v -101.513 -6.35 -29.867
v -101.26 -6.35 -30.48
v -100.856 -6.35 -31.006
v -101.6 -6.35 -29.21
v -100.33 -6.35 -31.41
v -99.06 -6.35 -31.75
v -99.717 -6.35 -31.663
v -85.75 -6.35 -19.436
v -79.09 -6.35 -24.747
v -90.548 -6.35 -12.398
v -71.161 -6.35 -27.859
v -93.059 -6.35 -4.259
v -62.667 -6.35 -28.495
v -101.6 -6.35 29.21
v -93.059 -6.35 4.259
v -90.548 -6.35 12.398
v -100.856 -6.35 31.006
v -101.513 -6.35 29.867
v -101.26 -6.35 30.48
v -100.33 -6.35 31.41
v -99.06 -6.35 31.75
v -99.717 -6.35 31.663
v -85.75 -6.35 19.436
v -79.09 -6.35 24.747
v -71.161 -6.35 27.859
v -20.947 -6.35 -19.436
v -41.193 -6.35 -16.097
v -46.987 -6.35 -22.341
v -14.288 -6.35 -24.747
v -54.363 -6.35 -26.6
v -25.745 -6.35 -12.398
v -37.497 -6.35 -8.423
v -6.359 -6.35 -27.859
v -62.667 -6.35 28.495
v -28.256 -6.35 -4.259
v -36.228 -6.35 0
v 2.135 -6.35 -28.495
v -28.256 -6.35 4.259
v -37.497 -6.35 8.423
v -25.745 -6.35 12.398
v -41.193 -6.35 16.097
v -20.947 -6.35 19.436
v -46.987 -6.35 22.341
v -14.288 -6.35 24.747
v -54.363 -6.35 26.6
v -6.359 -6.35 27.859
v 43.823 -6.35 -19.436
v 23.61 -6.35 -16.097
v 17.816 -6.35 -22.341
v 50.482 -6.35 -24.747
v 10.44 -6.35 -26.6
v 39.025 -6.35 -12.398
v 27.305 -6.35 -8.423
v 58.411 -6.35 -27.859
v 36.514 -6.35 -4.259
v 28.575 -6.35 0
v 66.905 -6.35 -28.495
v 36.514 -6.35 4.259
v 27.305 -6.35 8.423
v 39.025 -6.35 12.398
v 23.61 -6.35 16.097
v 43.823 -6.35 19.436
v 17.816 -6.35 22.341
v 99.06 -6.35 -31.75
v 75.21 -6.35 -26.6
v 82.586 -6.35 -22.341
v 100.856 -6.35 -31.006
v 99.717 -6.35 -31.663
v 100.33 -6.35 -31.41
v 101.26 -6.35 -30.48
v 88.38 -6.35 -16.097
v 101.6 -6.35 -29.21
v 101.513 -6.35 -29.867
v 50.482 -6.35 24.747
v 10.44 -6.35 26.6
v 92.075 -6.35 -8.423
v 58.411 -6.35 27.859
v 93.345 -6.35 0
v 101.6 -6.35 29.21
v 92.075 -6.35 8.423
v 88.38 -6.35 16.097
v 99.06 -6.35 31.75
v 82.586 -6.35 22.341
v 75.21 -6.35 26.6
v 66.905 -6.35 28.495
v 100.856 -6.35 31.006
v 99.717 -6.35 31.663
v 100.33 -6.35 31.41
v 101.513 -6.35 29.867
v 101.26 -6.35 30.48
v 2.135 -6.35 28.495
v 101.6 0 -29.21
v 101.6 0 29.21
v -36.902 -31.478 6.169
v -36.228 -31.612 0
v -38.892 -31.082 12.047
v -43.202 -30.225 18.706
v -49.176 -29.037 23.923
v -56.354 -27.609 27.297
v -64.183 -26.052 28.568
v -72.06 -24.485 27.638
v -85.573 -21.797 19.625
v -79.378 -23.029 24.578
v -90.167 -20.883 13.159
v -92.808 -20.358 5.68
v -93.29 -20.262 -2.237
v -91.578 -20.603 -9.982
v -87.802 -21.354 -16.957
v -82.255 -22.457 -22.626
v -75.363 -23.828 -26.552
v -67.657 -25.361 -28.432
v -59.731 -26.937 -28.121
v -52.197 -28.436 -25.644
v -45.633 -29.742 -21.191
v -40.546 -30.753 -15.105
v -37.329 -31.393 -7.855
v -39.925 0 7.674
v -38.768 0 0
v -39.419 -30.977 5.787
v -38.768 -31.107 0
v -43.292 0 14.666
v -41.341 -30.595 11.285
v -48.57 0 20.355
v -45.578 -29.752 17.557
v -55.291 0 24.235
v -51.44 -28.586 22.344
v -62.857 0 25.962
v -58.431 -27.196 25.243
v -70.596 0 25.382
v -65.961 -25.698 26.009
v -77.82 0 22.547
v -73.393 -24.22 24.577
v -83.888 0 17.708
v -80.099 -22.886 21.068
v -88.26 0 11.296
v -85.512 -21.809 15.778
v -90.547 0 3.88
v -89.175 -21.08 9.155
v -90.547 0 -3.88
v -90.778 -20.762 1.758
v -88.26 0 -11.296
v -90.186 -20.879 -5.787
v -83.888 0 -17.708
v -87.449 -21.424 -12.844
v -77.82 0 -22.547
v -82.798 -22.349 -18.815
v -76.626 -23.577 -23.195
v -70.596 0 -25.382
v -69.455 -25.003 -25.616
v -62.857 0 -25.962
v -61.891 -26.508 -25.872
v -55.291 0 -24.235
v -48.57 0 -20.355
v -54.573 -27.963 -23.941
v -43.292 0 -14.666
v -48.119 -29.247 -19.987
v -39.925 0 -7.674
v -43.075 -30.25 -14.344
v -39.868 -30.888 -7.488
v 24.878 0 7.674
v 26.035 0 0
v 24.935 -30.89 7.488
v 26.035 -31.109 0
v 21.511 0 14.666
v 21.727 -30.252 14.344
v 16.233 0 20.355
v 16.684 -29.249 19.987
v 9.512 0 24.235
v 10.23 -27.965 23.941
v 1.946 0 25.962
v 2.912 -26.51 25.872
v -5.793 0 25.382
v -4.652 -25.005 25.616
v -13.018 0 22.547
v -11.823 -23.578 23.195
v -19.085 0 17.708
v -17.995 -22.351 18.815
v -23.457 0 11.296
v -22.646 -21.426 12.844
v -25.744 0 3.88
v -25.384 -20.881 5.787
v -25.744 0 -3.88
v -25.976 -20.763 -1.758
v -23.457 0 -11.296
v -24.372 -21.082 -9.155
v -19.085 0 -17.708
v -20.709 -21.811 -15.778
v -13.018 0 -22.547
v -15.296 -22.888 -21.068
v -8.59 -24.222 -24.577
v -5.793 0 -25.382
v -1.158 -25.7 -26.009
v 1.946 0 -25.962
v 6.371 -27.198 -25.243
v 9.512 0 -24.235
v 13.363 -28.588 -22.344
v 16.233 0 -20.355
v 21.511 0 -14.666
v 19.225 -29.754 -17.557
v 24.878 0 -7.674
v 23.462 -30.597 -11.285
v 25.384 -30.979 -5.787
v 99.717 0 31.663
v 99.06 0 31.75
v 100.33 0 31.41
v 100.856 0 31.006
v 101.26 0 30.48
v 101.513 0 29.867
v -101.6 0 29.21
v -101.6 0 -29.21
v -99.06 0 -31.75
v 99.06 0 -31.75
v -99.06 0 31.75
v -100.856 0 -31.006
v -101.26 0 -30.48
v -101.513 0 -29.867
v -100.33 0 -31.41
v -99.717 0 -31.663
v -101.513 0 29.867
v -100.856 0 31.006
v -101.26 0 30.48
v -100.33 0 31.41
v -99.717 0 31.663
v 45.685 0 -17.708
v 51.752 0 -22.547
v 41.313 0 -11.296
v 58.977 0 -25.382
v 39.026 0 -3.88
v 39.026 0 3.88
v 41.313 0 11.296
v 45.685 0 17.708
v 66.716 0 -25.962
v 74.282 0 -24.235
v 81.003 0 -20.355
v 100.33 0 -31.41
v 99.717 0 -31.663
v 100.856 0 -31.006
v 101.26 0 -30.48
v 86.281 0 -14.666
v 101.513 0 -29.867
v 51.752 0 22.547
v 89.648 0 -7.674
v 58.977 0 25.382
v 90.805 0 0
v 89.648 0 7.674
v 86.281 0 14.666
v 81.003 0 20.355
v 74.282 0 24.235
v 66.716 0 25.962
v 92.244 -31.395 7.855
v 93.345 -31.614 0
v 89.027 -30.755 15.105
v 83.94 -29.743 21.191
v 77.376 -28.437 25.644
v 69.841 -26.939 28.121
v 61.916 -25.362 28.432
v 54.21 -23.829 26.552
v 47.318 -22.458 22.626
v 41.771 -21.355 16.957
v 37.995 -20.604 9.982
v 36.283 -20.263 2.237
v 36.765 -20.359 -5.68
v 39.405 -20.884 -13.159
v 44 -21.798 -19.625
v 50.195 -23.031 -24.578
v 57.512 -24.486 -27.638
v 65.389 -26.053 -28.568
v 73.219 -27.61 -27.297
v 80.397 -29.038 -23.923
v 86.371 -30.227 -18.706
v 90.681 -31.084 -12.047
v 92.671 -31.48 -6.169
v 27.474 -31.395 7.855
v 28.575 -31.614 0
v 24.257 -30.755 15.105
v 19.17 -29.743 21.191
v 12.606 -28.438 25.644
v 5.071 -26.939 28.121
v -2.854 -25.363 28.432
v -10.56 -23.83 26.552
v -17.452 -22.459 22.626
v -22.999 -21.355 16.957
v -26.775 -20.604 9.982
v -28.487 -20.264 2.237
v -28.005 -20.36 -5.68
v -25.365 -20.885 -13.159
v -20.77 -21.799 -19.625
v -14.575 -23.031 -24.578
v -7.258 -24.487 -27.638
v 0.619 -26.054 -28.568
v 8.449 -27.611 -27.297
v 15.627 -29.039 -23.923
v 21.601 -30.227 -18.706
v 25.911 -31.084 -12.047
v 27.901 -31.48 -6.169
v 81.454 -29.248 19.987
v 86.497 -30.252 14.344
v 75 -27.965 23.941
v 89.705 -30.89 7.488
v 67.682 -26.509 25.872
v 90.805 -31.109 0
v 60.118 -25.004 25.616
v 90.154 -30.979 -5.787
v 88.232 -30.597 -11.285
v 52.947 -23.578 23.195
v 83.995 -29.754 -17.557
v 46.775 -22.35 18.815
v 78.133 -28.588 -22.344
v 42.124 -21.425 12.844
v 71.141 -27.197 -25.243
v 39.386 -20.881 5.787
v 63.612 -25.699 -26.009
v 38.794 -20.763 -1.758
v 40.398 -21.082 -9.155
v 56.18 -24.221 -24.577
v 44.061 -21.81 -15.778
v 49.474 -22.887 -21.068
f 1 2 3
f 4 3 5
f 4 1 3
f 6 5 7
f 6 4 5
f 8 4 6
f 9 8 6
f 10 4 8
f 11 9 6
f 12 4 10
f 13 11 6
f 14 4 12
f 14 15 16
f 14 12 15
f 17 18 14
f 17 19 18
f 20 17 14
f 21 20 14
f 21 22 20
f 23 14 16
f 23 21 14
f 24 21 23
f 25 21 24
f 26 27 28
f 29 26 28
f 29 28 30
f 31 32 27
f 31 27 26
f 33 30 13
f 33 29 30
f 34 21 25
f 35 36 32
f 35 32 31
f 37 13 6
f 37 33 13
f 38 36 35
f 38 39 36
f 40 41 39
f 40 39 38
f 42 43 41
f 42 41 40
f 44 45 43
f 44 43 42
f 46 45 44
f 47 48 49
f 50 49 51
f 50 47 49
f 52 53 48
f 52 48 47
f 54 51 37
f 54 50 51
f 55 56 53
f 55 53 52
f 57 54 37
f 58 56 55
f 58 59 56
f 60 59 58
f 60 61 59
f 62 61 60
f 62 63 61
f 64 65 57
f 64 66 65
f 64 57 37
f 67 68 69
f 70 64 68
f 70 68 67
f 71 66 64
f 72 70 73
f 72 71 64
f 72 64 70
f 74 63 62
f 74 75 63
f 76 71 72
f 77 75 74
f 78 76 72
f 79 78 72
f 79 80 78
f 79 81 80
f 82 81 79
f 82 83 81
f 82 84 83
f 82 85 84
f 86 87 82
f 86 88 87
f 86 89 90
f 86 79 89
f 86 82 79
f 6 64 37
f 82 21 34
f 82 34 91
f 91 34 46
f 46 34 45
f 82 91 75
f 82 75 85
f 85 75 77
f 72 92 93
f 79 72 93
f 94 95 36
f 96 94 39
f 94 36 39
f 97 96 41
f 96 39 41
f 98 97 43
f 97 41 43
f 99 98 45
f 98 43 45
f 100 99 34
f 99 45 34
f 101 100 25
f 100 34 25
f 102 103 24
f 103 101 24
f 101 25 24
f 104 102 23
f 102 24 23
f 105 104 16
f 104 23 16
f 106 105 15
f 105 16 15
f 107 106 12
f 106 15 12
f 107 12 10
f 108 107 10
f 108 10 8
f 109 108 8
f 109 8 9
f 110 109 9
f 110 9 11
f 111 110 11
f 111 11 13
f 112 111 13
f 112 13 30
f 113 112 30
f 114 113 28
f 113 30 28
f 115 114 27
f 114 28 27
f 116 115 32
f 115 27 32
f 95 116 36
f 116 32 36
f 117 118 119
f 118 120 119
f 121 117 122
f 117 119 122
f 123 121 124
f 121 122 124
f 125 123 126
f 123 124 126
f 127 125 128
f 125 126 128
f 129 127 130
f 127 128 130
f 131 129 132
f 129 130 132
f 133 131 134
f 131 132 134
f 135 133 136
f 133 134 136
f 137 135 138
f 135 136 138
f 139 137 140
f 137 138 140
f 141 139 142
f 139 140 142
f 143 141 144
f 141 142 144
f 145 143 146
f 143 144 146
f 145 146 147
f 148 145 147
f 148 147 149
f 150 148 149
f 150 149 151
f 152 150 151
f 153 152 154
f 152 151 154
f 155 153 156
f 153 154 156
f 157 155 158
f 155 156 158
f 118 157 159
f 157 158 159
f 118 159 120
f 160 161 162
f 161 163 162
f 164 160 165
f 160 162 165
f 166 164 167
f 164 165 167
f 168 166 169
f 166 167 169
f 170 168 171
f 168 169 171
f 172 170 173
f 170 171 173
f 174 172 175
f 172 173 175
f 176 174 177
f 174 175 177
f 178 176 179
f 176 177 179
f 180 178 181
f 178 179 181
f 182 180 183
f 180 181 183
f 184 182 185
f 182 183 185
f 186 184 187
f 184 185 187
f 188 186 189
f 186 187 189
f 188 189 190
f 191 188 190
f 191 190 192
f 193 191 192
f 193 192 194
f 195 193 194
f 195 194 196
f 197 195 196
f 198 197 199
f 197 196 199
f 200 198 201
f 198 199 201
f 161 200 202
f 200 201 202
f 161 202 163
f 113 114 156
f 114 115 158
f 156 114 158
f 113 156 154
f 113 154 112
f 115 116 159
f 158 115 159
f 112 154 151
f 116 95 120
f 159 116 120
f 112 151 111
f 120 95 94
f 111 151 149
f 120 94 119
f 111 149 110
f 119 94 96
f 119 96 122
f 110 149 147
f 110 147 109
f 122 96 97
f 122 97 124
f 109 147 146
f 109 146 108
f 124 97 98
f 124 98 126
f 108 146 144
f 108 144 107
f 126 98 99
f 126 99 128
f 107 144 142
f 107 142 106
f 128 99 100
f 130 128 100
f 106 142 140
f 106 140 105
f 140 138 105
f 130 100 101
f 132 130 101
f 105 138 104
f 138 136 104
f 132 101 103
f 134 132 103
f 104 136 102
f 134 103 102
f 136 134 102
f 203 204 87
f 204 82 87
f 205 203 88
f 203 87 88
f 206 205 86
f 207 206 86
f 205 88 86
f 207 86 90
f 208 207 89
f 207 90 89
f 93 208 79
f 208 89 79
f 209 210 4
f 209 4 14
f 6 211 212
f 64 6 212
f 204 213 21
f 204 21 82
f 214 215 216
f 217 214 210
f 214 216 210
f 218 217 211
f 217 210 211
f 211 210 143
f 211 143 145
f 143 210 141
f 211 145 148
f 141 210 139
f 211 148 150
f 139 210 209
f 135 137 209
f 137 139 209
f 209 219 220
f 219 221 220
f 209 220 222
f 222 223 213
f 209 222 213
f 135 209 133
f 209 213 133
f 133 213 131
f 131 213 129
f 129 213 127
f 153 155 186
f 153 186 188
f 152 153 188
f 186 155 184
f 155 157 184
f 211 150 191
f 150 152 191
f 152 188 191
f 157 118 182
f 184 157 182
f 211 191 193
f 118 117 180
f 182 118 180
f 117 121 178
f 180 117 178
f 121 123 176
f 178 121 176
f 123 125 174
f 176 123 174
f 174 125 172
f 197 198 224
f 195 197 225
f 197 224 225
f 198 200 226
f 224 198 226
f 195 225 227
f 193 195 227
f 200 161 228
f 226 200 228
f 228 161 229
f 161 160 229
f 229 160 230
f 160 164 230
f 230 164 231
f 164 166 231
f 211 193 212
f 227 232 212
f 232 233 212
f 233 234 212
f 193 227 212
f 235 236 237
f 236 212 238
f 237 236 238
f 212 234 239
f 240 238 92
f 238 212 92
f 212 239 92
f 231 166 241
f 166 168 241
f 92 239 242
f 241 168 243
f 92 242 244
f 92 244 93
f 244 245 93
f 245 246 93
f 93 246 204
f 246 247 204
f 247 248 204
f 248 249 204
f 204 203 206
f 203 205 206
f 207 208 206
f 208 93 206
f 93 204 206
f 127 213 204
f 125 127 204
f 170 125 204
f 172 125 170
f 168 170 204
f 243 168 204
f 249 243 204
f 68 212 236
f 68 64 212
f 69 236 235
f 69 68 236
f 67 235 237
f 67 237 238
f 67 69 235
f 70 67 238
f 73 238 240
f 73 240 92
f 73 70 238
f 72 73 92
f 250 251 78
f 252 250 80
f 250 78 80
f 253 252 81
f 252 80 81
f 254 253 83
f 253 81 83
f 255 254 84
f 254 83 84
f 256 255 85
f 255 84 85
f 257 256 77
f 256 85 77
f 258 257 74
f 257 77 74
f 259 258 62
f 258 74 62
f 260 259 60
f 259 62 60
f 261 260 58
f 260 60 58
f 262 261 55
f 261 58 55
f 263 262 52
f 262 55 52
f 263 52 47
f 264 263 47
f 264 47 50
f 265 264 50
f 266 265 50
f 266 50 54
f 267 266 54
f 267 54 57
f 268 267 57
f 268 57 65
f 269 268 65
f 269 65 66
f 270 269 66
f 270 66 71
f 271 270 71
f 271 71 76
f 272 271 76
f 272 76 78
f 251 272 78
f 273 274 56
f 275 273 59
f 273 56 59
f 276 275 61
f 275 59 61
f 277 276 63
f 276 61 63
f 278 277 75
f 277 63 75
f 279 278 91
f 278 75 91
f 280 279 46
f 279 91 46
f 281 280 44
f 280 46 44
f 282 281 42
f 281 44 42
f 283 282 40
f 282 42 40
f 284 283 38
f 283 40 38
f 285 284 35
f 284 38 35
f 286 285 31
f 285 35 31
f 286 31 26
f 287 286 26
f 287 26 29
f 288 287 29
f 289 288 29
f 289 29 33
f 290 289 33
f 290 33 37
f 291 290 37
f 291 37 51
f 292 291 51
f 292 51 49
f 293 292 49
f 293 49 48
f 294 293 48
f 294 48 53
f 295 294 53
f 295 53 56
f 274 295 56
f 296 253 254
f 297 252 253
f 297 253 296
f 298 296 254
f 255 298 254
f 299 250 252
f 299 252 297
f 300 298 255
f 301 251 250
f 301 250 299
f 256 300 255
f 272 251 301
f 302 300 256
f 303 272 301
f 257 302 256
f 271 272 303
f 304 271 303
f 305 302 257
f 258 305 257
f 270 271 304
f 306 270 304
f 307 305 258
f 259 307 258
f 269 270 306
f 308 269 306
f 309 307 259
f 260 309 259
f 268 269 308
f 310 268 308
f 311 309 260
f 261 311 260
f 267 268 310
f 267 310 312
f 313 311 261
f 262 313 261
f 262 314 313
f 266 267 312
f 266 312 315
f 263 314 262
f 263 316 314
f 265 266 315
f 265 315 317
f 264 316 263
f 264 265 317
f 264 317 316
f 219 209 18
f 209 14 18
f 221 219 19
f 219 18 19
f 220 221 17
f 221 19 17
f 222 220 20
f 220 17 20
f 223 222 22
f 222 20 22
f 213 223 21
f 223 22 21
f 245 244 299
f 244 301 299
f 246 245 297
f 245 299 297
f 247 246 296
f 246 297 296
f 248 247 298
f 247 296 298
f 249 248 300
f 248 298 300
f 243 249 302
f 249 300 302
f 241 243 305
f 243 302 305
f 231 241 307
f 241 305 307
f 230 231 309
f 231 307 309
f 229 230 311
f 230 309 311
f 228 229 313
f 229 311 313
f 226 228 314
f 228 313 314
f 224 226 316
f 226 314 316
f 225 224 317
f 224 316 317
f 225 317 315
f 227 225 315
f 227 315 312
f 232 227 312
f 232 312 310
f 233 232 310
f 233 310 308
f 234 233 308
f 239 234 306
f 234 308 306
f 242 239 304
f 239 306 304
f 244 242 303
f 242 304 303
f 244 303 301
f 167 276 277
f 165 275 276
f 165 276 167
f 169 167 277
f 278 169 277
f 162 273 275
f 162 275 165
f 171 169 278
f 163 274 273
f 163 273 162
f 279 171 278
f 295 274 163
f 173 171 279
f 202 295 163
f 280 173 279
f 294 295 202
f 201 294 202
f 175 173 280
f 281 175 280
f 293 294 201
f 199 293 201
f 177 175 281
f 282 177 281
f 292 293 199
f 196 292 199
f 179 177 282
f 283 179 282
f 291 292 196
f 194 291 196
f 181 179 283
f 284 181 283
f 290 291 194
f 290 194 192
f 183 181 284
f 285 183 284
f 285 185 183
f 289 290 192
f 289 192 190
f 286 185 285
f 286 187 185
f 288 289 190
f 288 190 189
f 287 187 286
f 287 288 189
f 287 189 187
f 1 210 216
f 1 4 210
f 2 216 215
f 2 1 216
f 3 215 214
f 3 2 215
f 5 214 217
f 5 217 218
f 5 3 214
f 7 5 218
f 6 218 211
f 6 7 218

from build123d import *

# Parameters (mm, degrees)
F0_W     = 203.2
F0_H     = 63.5
F1_DEPTH = 6.35
F2_R     = 26.035
F3_DEPTH = 12.7
F4_R     = 28.575
F4_R_2   = 26.035
F5_DEPTH = 25.4
F7_DEPTH = 31.75
F8_R     = 2.54


# Not quite as in the source:
# - a feature names something its author has since deleted; it is built from what else it names


with BuildPart() as f1:
    # F0 (on Front) → F1 (new body)
    with BuildSketch(Plane.XZ):
        Rectangle(F0_W, F0_H)
    extrude(amount=F1_DEPTH)

    # F2 (on face) → F3 (cut)
    with BuildSketch(Plane.XZ.offset(6.35)):
        with Locations((-64.8028552532, 0)):
            Circle(F2_R)
        Circle(F2_R)
        with Locations((64.77, 0)):
            Circle(F2_R)
    extrude(amount=-F3_DEPTH, mode=Mode.SUBTRACT)

    # F4 (on face) → F5 (join)
    with BuildSketch(Plane.XZ.offset(6.35)):
        with Locations((-64.8028552532, 0)):
            Circle(F4_R)
        with Locations((-64.8028552532, 0)):
            Circle(F4_R_2, mode=Mode.SUBTRACT)
        Circle(F4_R)
        Circle(F4_R_2, mode=Mode.SUBTRACT)
        with Locations((64.77, 0)):
            Circle(F4_R)
        with Locations((64.77, 0)):
            Circle(F4_R_2, mode=Mode.SUBTRACT)
    extrude(amount=F5_DEPTH)

    # F6 (on Top) → F7 (cut, symmetric)
    with BuildSketch(Plane.XY):
        Polygon((35.6169715524, -20.1309207911), (35.6169715524, -32.004), (95.3069715524, -32.004), align=None)
        Polygon((-29.1554266587, -20.1309207911), (-29.1554266587, -32.004), (30.5345733413, -32.004), align=None)
        Polygon((-93.9486771822, -20.1309207911), (-93.9486771822, -32.004), (-34.2586771822, -32.004), align=None)
    extrude(amount=F7_DEPTH, both=True, mode=Mode.SUBTRACT)

    # F8
    f8_edges = [f1.edges().sort_by_distance(p)[0] for p in [
        (-101.6, -3.175, -31.75),
        (-101.6, -3.175, 31.75),
        (101.6, -3.175, 31.75),
        (101.6, -3.175, -31.75),
    ]]
    fillet(f8_edges, radius=F8_R)


solid = f1.part
